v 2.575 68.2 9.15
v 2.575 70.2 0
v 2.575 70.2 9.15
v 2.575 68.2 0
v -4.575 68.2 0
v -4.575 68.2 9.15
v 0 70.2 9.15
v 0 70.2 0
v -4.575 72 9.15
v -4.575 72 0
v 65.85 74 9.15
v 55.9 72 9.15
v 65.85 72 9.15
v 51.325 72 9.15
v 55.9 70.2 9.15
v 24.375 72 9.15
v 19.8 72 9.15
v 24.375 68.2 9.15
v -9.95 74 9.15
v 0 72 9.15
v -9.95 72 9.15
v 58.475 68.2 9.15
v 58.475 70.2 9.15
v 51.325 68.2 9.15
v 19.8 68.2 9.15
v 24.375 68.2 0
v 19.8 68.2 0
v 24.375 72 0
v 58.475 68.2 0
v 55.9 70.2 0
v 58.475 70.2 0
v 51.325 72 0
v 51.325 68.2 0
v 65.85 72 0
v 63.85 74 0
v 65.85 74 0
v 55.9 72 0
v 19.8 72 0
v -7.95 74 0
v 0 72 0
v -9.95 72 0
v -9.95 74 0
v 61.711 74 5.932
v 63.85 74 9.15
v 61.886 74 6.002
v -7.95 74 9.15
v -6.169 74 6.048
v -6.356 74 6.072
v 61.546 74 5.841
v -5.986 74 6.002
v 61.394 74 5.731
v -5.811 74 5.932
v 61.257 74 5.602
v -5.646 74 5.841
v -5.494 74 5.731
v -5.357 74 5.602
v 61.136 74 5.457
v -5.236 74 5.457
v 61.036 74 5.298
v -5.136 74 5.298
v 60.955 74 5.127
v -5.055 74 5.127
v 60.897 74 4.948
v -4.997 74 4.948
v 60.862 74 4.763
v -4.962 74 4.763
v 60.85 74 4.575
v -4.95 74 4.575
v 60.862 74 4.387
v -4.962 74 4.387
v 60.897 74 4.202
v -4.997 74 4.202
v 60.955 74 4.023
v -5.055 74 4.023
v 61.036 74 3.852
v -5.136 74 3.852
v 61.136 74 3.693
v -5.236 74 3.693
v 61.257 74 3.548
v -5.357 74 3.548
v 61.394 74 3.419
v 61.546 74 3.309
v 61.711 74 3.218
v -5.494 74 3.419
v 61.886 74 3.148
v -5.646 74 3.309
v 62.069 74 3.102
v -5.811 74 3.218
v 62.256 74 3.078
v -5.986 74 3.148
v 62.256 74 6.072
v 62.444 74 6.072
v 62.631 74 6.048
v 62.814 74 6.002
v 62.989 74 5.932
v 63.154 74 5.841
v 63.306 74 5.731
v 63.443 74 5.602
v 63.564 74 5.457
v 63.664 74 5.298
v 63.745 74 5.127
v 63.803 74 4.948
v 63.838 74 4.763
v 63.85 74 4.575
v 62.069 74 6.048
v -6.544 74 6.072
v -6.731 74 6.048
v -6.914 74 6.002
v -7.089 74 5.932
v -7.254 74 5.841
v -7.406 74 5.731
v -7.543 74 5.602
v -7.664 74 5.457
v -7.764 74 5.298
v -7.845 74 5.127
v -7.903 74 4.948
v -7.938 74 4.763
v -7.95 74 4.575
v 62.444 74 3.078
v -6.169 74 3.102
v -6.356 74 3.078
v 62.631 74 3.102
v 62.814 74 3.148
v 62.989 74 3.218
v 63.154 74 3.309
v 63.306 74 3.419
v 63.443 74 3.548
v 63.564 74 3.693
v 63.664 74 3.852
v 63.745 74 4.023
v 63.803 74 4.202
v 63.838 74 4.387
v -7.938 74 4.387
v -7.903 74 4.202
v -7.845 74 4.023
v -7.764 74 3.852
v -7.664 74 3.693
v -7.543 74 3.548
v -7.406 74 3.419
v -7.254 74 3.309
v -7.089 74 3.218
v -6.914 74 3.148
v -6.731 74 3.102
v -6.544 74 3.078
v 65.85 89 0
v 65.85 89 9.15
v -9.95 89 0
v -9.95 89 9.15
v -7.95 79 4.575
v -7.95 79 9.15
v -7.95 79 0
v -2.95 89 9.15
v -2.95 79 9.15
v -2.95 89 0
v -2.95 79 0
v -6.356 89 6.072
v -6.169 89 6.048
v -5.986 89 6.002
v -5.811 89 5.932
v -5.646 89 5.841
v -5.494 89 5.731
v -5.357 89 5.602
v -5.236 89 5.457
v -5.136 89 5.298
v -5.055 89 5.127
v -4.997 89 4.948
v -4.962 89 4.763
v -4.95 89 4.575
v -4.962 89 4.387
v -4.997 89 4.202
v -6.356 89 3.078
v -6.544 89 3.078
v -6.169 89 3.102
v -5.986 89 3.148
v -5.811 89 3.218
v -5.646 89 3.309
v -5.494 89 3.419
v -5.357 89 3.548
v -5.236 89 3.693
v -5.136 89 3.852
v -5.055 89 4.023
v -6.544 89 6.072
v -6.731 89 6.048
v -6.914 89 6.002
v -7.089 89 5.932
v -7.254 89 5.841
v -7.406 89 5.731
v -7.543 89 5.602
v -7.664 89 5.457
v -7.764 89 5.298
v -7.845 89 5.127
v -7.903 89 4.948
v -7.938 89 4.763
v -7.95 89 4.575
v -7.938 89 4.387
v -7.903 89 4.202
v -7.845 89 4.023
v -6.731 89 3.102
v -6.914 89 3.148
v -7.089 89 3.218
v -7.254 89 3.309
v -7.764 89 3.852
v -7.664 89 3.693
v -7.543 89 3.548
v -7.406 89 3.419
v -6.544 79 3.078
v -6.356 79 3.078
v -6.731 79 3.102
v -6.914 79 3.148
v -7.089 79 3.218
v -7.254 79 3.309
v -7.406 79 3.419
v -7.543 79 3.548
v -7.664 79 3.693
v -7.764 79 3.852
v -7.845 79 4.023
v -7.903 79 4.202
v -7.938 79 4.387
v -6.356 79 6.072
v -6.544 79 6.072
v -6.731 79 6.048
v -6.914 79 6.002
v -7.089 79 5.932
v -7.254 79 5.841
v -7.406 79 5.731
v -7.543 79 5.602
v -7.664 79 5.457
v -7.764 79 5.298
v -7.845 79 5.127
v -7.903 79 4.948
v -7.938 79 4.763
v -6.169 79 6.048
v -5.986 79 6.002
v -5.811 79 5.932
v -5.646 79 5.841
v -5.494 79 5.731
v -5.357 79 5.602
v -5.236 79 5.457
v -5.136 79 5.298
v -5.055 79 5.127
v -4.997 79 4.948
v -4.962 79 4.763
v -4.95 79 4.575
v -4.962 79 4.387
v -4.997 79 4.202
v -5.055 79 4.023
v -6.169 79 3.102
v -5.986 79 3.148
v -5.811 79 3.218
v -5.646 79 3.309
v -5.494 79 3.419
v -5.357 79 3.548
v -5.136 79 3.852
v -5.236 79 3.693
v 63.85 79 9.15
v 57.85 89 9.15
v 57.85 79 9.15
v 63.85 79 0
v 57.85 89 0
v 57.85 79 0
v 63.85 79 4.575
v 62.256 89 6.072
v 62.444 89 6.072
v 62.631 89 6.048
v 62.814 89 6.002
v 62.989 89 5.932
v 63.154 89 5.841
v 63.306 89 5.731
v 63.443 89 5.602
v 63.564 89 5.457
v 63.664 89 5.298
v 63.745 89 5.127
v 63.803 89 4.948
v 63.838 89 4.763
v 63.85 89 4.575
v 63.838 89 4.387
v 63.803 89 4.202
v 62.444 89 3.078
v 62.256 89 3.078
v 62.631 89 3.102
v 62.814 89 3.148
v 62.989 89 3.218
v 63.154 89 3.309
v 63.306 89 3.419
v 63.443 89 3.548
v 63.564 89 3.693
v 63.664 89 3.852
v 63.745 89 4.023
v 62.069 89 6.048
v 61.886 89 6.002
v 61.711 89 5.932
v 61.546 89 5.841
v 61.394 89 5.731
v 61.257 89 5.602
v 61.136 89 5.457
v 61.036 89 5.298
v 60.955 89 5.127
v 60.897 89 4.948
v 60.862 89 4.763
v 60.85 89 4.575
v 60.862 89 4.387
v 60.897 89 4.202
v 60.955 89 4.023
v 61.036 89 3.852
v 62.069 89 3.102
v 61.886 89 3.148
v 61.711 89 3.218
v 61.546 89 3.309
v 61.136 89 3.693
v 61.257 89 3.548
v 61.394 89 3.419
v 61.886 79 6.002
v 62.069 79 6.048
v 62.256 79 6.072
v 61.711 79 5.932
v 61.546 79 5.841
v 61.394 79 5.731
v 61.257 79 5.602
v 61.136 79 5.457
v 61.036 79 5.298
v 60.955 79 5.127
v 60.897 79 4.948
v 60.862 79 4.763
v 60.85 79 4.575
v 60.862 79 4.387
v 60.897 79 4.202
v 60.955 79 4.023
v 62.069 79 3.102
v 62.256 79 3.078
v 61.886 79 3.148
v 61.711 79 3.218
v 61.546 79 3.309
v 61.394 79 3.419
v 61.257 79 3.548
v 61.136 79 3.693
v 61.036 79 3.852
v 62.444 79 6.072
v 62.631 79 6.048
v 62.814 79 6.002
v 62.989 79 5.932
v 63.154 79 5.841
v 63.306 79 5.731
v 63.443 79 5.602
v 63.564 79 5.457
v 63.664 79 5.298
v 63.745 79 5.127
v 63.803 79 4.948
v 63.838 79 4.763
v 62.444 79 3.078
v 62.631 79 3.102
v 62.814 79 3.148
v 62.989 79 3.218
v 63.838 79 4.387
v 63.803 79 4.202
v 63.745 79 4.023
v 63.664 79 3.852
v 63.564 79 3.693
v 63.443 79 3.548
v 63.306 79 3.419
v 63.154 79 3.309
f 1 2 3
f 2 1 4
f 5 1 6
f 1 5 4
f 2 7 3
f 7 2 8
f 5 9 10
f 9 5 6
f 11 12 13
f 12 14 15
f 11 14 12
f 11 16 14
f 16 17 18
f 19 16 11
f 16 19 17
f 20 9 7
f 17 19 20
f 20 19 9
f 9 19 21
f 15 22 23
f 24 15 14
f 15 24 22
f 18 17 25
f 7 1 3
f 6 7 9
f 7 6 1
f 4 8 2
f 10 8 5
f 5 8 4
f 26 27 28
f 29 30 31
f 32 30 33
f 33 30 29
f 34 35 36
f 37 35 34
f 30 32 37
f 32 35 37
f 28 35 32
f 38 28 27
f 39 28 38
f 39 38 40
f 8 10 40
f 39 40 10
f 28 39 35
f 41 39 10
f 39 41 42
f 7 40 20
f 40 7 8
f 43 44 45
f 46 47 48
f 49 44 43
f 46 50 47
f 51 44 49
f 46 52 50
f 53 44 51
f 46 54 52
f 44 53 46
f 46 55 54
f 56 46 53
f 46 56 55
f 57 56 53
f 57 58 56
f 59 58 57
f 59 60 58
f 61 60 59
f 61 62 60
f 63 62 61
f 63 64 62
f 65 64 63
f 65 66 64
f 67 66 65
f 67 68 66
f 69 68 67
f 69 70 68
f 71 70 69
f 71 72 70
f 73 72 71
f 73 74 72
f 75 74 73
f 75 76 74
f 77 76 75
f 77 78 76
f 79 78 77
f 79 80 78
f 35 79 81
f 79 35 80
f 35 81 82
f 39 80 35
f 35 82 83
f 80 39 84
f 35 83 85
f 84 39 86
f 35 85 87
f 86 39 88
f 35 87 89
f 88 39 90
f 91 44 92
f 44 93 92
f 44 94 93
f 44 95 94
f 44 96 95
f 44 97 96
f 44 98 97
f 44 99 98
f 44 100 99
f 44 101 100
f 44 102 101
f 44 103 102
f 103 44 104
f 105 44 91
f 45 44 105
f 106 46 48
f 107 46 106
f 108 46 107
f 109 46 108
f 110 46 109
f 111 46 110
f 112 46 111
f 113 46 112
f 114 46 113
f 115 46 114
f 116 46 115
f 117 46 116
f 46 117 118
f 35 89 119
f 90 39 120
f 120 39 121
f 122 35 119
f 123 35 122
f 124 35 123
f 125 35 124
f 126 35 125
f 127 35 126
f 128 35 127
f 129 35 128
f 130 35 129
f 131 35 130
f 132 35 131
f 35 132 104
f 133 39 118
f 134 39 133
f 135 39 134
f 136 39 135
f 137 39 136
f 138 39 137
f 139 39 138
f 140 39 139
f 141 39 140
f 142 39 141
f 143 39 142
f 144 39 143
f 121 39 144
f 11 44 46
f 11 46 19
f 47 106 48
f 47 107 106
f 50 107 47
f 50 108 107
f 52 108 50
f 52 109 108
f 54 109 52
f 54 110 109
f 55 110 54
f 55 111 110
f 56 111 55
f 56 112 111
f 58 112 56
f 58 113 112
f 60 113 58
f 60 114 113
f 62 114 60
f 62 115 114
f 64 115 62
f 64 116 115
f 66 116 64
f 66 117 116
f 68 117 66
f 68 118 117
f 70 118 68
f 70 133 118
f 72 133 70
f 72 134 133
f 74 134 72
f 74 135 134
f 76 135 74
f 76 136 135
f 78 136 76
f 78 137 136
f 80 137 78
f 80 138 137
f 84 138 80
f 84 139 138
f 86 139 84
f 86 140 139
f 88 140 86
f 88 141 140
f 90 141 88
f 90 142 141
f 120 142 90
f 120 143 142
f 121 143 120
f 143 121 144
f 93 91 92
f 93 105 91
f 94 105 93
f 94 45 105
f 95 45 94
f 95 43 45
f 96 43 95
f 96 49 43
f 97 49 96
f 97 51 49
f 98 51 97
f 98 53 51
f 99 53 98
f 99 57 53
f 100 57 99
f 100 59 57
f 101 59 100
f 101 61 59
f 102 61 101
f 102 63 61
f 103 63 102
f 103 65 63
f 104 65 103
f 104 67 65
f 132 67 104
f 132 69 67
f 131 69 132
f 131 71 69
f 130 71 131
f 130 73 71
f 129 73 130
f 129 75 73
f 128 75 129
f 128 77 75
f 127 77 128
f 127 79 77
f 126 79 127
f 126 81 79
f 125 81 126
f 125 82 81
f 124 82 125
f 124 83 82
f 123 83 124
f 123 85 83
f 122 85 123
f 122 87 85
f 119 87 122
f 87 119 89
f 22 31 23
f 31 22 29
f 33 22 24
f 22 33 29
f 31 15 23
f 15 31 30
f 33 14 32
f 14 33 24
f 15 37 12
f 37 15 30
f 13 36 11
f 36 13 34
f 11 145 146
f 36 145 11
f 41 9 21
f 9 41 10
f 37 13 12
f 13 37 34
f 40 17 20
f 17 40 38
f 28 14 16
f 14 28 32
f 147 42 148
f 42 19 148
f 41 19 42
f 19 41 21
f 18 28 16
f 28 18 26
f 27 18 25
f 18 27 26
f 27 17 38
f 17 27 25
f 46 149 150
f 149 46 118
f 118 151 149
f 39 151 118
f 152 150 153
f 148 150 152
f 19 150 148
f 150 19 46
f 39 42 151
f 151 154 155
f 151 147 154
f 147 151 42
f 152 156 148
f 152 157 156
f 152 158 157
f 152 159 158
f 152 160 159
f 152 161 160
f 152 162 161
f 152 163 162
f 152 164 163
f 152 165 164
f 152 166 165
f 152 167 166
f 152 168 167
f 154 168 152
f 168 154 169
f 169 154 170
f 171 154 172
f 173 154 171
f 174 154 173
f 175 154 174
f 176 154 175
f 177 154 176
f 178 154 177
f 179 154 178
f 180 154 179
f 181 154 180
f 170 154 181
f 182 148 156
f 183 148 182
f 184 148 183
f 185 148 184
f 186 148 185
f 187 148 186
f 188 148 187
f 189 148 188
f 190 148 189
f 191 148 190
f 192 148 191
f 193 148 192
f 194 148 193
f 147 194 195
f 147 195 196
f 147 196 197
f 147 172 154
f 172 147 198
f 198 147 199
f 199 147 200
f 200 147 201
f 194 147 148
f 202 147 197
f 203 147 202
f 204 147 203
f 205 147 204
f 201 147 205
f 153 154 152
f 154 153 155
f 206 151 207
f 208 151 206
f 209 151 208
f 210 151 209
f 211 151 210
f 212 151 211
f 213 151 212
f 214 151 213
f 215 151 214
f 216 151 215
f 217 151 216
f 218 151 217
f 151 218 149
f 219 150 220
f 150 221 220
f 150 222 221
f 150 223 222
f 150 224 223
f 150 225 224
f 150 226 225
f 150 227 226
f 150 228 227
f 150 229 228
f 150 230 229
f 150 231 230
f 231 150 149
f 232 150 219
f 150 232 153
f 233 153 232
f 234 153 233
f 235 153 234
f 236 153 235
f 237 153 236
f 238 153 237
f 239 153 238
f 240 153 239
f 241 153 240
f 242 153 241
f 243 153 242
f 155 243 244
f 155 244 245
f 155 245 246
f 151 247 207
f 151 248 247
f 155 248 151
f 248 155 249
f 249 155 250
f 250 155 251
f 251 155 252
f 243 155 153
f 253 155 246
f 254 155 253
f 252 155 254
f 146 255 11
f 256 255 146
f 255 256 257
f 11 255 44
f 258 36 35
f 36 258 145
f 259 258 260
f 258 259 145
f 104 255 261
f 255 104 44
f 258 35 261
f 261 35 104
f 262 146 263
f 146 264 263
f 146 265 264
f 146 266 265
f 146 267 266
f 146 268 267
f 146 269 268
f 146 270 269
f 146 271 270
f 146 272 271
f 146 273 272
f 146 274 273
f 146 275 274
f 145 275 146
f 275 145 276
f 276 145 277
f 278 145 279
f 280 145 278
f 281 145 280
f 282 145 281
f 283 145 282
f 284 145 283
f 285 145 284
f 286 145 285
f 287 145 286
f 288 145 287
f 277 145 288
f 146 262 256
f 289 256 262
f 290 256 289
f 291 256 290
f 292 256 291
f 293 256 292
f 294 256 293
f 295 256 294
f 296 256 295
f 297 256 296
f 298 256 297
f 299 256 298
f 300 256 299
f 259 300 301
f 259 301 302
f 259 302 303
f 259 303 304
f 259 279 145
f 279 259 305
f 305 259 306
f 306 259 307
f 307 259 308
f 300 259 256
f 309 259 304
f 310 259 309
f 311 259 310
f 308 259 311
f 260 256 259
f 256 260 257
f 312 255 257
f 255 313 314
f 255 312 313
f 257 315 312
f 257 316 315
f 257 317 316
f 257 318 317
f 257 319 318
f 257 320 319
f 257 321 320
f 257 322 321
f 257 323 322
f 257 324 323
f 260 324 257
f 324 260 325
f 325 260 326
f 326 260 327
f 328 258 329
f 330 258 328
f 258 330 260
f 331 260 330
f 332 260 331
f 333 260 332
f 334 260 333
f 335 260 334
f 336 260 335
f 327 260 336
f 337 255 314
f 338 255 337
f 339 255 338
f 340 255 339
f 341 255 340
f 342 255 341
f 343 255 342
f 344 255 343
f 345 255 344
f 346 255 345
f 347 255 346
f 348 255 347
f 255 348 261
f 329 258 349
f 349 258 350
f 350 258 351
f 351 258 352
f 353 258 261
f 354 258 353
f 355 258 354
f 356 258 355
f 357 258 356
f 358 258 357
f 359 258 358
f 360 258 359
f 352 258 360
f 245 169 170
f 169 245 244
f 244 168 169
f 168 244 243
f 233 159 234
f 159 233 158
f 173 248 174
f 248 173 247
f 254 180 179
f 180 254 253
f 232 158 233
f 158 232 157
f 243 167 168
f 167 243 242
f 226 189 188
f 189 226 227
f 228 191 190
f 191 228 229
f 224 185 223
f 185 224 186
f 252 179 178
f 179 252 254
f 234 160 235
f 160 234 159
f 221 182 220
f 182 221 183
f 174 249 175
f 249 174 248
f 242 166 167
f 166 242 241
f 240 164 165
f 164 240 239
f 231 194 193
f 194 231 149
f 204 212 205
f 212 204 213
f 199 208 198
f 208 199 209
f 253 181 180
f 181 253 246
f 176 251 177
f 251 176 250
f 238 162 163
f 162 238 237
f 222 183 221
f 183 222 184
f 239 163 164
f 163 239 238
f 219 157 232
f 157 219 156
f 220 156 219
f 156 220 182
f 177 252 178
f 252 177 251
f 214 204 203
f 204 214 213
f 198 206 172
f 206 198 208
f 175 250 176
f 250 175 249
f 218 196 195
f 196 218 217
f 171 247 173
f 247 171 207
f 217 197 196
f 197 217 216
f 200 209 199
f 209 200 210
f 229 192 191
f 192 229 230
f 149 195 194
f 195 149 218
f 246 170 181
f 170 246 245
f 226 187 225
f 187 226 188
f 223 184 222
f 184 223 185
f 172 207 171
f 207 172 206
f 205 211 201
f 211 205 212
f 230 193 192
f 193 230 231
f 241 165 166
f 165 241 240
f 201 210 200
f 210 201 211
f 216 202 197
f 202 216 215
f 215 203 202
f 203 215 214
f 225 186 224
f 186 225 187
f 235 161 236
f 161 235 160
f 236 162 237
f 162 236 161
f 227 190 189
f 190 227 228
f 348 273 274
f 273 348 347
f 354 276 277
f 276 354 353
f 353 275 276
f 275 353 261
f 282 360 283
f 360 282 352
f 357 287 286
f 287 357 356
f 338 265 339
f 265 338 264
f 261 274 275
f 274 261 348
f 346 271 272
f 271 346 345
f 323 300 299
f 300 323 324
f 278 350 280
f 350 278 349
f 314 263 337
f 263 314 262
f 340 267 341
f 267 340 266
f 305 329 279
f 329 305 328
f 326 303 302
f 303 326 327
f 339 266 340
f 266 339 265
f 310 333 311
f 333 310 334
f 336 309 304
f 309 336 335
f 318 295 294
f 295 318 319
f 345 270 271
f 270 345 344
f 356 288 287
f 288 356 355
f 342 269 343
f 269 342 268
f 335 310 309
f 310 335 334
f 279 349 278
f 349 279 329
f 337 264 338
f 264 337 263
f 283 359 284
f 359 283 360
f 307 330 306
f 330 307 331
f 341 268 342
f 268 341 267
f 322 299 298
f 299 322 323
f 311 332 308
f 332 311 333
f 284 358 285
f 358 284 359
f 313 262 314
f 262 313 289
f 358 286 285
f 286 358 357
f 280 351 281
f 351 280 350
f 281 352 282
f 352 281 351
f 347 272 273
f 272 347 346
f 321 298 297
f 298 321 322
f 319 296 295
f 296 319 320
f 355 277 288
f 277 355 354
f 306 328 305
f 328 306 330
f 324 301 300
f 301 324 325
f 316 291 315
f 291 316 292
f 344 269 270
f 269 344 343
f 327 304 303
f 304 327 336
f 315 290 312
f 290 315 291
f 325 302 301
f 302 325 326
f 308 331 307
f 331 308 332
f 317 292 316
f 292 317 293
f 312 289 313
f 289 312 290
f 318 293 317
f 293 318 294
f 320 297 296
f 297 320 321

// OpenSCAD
$fn=50;
ts=2;

kv=9.95;//размер ячейкм
kv1=kv-0.8;
dd=18;//растояние между ячейками
tst=1.8;//толщина стенки = сетки
dot=3;//for sanorez
hn=4;//h nogi
dno=kv*1.7;//d fix

mot=15; //длина стоек от стены
smr=3;//диаметр самореза
dsm=10;//длина под саморез

dotv=4.5;
lot=10;
step=30;
coun=3;

dk=kv*1.7;
dv=kv*0.9;


smart=[74,12,10];

//sm();
translate([0,smart.x,0])nv();//новый фикстатор

module sm(){
    difference(){
        translate([(dd+kv),0,0])difference(){
            translate([0,0,(smart.y+2*ts)/2])cube([ (dd+kv)*2+kv*2+10,smart.x+2*ts, smart.y+2*ts],true);
            translate([ts+0.1,0,(smart.y+2*ts)/2])cube([ (dd+kv)*2+kv*2+10,smart.x, smart.y],true);
            translate([ts+0.1,0,(smart.y+2*ts)/2+2*ts])cube([ (dd+kv)*2+kv*2+10,smart.x-smart.z, smart.y+4*ts],true);
            translate([ts+0.1,0,(smart.y+2*ts)/2+2*ts])cube([ (dd+kv)*2+kv*2+4*ts+10,smart.x/2, smart.y+4*ts],true);
        }
        translate([-kv+ts+smr/2,0,-0.1])rotate([0,0,0])cylinder(ts+0.2, smr/2, smr/2+ts);
        translate([(dd+kv)*2+kv-ts-smr/2,0,-0.1])rotate([0,0,0])cylinder(ts+0.2, smr/2, smr/2+ts);
}
}




module nv(){
    difference(){
        union(){
            translate([-kv+ts/2,mot/2,kv1/2])cube([ ts,mot, kv1],true);
            translate([-kv+(ts*2+smr)/2,mot-dsm/2,kv1/2])cube([ ts*2+smr,dsm, kv1],true);
            translate([(dd+kv)*2+kv-ts/2,mot/2,kv1/2])cube([ ts,mot, kv1],true);
            translate([(dd+kv)*2+kv-ts/2-(ts*2+smr)/2,mot-dsm/2,kv1/2])cube([ ts*2+smr,dsm, kv1],true);
            translate([0,0,kv1/2])rotate([90,0,0]){
                translate([(dd+kv),0,ts/2])cube([ (dd+kv)*2+kv*2,kv1, ts],true);
                translate([0,0,0])krk();
                translate([dd+kv,0,0])stp();
                translate([(dd+kv)*2,0,0])krk();
            }
        }
        translate([-kv+ts+smr/2,0,kv1/2])rotate([-90,0,0])cylinder(dsm*10+mot, smr/2, smr/2);
        translate([(dd+kv)*2+kv-ts-smr/2,0,kv1/2])rotate([-90,0,0])cylinder(dsm*10+mot, smr/2, smr/2);
    }
}

// ((dd+kv)*2+kv-ts-smr/2)-(-kv+ts+smr/2)

//all1();

module all1(){
    difference(){
        union(){
            translate([0,(dk+3*ts)/2,0])line1();
            translate([0,-(dk+3*ts)/2,0])line1();
        }
        translate([+step/2,0,-1])cylinder(ts*4, smr/2+0.2, smr/2+0.2);
        translate([((dd+kv)*2+kv-ts-smr/2)-(-kv+ts+smr/2)+step/2,0,-1])cylinder(ts*4, smr/2+0.2, smr/2+0.2);
    }
}


//krk();
module krk(){
    translate([-ts/2,0,ts/2+ts+tst])cube([ kv1-ts,kv1, ts],true);  
    translate([-kv1/4,0,(ts+tst)/2])cube([ kv1/2,kv1, ts+tst],true);   
}

module stp(){
    //translate([0,0,ts/2+ts+tst])cube([ kv1,kv1, ts],true);  
    translate([-kv1/4-kv1/2+1,0,(ts+tst+ts)/2])cube([ kv1/2,kv1, ts+tst+ts],true);   
}


module line1(){
    intersection(){
        difference(){
            union(){
                translate([coun*step/2,0,ts/2])cube([ coun*step+step+step/4,dk+3*ts, ts],true);
                translate([coun*step/2,0,(lot*0.7)/2])cube([ coun*step+step+step/4,ts, lot*0.7],true);
                for (as=[0:1:coun]){
                    translate([as*step,0,0])rotate([0,45,0])cylinder(lot*2, dotv/2+ts, dotv/2+ts);
                }
            }
            for (as=[0:1:coun]){
                translate([as*step,0,0])rotate([0,45,0])translate([0,0,-dotv/2])cylinder(lot*4, dotv/2, dotv/2);
            }
        }
       translate([coun*step/2,0,lot])cube([ 2*(coun*step+step+step/4),(dk+3*ts)*2, lot*2],true); 
    }
}








module fix(){
    difference(){
        union(){
            translate([(dd+kv)/2,0,ts/2])cube([ dd+kv,kv/2, ts],true);
            translate([0,0,ts/2+ts+tst])rotate([0,0,45])cube([ kv-0.2,kv-0.2, ts],true);
            cylinder(ts, dk/2, dk/2);
            translate([0,0,0])cylinder(ts+tst, dv/2, dv/2);
            //translate([0,0,-(ts+hn)+0.1])cylinder((ts+hn), dv/2, dv/2);
            //translate([0,0,-(ts+hn)+0.1-ts])cylinder(ts, dno/2, dno/2);
            translate([dd+kv,0,0]){
                translate([0,0,(2*ts+tst)/2])rotate([0,0,0])cube([ kv-0.2,kv-0.2, 2*ts+tst],true);
                cylinder(ts, dk/2, dk/2);
            }
        }
        translate([0,0,-0.1])cylinder((ts+tst)*2, dot/2, dot/2);
    }
}
//line();
module all(){
    //difference(){
        line();
    //    translate([-step/2-ts*3,0,kv])rotate([0,-90,0])minus();
    //}
    translate([-step+2*ts+ts/2,0,ts+dk/2])rotate([0,-90,0])fix();
}    
    
    
module minus(){
    translate([0,0,(2*ts+tst)/2])rotate([0,0,0])cube([ kv-0.2,kv-0.2, 2*ts+tst],true);
    translate([dd+kv,0,(2*ts+tst)/2])rotate([0,0,0])cube([ kv-0.2,kv-0.2, 2*ts+tst],true);
}


module line(){
    difference(){
        union(){
            translate([coun*step/2-step/4,0,ts/2])cube([ coun*step+step+step/4,dk+3*ts, ts],true);
            translate([0,(dk+3*ts)/2-ts/2,(dd+kv/2)/2])cube([ step*2-step/4,ts, (dd+kv/2)],true);
            translate([0,-((dk+3*ts)/2-ts/2),(dd+kv/2)/2])cube([ step*2-step/4,ts, (dd+kv/2)],true);
            translate([-step+2*ts,0,(dd*2+kv*1)/2])cube([ ts,dk+3*ts, (dd*2+kv*1)],true);
            translate([coun*step/2,0,lot/2])cube([ coun*step,ts, lot],true);
            for (as=[0:1:coun]){
                translate([as*step,0,0])cylinder(lot, dotv/2+ts, dotv/2+ts);
            }
        }
        for (as=[0:1:coun]){
            translate([as*step,0,-1])cylinder(lot*2, dotv/2, dotv/2);
        }
    }
}
